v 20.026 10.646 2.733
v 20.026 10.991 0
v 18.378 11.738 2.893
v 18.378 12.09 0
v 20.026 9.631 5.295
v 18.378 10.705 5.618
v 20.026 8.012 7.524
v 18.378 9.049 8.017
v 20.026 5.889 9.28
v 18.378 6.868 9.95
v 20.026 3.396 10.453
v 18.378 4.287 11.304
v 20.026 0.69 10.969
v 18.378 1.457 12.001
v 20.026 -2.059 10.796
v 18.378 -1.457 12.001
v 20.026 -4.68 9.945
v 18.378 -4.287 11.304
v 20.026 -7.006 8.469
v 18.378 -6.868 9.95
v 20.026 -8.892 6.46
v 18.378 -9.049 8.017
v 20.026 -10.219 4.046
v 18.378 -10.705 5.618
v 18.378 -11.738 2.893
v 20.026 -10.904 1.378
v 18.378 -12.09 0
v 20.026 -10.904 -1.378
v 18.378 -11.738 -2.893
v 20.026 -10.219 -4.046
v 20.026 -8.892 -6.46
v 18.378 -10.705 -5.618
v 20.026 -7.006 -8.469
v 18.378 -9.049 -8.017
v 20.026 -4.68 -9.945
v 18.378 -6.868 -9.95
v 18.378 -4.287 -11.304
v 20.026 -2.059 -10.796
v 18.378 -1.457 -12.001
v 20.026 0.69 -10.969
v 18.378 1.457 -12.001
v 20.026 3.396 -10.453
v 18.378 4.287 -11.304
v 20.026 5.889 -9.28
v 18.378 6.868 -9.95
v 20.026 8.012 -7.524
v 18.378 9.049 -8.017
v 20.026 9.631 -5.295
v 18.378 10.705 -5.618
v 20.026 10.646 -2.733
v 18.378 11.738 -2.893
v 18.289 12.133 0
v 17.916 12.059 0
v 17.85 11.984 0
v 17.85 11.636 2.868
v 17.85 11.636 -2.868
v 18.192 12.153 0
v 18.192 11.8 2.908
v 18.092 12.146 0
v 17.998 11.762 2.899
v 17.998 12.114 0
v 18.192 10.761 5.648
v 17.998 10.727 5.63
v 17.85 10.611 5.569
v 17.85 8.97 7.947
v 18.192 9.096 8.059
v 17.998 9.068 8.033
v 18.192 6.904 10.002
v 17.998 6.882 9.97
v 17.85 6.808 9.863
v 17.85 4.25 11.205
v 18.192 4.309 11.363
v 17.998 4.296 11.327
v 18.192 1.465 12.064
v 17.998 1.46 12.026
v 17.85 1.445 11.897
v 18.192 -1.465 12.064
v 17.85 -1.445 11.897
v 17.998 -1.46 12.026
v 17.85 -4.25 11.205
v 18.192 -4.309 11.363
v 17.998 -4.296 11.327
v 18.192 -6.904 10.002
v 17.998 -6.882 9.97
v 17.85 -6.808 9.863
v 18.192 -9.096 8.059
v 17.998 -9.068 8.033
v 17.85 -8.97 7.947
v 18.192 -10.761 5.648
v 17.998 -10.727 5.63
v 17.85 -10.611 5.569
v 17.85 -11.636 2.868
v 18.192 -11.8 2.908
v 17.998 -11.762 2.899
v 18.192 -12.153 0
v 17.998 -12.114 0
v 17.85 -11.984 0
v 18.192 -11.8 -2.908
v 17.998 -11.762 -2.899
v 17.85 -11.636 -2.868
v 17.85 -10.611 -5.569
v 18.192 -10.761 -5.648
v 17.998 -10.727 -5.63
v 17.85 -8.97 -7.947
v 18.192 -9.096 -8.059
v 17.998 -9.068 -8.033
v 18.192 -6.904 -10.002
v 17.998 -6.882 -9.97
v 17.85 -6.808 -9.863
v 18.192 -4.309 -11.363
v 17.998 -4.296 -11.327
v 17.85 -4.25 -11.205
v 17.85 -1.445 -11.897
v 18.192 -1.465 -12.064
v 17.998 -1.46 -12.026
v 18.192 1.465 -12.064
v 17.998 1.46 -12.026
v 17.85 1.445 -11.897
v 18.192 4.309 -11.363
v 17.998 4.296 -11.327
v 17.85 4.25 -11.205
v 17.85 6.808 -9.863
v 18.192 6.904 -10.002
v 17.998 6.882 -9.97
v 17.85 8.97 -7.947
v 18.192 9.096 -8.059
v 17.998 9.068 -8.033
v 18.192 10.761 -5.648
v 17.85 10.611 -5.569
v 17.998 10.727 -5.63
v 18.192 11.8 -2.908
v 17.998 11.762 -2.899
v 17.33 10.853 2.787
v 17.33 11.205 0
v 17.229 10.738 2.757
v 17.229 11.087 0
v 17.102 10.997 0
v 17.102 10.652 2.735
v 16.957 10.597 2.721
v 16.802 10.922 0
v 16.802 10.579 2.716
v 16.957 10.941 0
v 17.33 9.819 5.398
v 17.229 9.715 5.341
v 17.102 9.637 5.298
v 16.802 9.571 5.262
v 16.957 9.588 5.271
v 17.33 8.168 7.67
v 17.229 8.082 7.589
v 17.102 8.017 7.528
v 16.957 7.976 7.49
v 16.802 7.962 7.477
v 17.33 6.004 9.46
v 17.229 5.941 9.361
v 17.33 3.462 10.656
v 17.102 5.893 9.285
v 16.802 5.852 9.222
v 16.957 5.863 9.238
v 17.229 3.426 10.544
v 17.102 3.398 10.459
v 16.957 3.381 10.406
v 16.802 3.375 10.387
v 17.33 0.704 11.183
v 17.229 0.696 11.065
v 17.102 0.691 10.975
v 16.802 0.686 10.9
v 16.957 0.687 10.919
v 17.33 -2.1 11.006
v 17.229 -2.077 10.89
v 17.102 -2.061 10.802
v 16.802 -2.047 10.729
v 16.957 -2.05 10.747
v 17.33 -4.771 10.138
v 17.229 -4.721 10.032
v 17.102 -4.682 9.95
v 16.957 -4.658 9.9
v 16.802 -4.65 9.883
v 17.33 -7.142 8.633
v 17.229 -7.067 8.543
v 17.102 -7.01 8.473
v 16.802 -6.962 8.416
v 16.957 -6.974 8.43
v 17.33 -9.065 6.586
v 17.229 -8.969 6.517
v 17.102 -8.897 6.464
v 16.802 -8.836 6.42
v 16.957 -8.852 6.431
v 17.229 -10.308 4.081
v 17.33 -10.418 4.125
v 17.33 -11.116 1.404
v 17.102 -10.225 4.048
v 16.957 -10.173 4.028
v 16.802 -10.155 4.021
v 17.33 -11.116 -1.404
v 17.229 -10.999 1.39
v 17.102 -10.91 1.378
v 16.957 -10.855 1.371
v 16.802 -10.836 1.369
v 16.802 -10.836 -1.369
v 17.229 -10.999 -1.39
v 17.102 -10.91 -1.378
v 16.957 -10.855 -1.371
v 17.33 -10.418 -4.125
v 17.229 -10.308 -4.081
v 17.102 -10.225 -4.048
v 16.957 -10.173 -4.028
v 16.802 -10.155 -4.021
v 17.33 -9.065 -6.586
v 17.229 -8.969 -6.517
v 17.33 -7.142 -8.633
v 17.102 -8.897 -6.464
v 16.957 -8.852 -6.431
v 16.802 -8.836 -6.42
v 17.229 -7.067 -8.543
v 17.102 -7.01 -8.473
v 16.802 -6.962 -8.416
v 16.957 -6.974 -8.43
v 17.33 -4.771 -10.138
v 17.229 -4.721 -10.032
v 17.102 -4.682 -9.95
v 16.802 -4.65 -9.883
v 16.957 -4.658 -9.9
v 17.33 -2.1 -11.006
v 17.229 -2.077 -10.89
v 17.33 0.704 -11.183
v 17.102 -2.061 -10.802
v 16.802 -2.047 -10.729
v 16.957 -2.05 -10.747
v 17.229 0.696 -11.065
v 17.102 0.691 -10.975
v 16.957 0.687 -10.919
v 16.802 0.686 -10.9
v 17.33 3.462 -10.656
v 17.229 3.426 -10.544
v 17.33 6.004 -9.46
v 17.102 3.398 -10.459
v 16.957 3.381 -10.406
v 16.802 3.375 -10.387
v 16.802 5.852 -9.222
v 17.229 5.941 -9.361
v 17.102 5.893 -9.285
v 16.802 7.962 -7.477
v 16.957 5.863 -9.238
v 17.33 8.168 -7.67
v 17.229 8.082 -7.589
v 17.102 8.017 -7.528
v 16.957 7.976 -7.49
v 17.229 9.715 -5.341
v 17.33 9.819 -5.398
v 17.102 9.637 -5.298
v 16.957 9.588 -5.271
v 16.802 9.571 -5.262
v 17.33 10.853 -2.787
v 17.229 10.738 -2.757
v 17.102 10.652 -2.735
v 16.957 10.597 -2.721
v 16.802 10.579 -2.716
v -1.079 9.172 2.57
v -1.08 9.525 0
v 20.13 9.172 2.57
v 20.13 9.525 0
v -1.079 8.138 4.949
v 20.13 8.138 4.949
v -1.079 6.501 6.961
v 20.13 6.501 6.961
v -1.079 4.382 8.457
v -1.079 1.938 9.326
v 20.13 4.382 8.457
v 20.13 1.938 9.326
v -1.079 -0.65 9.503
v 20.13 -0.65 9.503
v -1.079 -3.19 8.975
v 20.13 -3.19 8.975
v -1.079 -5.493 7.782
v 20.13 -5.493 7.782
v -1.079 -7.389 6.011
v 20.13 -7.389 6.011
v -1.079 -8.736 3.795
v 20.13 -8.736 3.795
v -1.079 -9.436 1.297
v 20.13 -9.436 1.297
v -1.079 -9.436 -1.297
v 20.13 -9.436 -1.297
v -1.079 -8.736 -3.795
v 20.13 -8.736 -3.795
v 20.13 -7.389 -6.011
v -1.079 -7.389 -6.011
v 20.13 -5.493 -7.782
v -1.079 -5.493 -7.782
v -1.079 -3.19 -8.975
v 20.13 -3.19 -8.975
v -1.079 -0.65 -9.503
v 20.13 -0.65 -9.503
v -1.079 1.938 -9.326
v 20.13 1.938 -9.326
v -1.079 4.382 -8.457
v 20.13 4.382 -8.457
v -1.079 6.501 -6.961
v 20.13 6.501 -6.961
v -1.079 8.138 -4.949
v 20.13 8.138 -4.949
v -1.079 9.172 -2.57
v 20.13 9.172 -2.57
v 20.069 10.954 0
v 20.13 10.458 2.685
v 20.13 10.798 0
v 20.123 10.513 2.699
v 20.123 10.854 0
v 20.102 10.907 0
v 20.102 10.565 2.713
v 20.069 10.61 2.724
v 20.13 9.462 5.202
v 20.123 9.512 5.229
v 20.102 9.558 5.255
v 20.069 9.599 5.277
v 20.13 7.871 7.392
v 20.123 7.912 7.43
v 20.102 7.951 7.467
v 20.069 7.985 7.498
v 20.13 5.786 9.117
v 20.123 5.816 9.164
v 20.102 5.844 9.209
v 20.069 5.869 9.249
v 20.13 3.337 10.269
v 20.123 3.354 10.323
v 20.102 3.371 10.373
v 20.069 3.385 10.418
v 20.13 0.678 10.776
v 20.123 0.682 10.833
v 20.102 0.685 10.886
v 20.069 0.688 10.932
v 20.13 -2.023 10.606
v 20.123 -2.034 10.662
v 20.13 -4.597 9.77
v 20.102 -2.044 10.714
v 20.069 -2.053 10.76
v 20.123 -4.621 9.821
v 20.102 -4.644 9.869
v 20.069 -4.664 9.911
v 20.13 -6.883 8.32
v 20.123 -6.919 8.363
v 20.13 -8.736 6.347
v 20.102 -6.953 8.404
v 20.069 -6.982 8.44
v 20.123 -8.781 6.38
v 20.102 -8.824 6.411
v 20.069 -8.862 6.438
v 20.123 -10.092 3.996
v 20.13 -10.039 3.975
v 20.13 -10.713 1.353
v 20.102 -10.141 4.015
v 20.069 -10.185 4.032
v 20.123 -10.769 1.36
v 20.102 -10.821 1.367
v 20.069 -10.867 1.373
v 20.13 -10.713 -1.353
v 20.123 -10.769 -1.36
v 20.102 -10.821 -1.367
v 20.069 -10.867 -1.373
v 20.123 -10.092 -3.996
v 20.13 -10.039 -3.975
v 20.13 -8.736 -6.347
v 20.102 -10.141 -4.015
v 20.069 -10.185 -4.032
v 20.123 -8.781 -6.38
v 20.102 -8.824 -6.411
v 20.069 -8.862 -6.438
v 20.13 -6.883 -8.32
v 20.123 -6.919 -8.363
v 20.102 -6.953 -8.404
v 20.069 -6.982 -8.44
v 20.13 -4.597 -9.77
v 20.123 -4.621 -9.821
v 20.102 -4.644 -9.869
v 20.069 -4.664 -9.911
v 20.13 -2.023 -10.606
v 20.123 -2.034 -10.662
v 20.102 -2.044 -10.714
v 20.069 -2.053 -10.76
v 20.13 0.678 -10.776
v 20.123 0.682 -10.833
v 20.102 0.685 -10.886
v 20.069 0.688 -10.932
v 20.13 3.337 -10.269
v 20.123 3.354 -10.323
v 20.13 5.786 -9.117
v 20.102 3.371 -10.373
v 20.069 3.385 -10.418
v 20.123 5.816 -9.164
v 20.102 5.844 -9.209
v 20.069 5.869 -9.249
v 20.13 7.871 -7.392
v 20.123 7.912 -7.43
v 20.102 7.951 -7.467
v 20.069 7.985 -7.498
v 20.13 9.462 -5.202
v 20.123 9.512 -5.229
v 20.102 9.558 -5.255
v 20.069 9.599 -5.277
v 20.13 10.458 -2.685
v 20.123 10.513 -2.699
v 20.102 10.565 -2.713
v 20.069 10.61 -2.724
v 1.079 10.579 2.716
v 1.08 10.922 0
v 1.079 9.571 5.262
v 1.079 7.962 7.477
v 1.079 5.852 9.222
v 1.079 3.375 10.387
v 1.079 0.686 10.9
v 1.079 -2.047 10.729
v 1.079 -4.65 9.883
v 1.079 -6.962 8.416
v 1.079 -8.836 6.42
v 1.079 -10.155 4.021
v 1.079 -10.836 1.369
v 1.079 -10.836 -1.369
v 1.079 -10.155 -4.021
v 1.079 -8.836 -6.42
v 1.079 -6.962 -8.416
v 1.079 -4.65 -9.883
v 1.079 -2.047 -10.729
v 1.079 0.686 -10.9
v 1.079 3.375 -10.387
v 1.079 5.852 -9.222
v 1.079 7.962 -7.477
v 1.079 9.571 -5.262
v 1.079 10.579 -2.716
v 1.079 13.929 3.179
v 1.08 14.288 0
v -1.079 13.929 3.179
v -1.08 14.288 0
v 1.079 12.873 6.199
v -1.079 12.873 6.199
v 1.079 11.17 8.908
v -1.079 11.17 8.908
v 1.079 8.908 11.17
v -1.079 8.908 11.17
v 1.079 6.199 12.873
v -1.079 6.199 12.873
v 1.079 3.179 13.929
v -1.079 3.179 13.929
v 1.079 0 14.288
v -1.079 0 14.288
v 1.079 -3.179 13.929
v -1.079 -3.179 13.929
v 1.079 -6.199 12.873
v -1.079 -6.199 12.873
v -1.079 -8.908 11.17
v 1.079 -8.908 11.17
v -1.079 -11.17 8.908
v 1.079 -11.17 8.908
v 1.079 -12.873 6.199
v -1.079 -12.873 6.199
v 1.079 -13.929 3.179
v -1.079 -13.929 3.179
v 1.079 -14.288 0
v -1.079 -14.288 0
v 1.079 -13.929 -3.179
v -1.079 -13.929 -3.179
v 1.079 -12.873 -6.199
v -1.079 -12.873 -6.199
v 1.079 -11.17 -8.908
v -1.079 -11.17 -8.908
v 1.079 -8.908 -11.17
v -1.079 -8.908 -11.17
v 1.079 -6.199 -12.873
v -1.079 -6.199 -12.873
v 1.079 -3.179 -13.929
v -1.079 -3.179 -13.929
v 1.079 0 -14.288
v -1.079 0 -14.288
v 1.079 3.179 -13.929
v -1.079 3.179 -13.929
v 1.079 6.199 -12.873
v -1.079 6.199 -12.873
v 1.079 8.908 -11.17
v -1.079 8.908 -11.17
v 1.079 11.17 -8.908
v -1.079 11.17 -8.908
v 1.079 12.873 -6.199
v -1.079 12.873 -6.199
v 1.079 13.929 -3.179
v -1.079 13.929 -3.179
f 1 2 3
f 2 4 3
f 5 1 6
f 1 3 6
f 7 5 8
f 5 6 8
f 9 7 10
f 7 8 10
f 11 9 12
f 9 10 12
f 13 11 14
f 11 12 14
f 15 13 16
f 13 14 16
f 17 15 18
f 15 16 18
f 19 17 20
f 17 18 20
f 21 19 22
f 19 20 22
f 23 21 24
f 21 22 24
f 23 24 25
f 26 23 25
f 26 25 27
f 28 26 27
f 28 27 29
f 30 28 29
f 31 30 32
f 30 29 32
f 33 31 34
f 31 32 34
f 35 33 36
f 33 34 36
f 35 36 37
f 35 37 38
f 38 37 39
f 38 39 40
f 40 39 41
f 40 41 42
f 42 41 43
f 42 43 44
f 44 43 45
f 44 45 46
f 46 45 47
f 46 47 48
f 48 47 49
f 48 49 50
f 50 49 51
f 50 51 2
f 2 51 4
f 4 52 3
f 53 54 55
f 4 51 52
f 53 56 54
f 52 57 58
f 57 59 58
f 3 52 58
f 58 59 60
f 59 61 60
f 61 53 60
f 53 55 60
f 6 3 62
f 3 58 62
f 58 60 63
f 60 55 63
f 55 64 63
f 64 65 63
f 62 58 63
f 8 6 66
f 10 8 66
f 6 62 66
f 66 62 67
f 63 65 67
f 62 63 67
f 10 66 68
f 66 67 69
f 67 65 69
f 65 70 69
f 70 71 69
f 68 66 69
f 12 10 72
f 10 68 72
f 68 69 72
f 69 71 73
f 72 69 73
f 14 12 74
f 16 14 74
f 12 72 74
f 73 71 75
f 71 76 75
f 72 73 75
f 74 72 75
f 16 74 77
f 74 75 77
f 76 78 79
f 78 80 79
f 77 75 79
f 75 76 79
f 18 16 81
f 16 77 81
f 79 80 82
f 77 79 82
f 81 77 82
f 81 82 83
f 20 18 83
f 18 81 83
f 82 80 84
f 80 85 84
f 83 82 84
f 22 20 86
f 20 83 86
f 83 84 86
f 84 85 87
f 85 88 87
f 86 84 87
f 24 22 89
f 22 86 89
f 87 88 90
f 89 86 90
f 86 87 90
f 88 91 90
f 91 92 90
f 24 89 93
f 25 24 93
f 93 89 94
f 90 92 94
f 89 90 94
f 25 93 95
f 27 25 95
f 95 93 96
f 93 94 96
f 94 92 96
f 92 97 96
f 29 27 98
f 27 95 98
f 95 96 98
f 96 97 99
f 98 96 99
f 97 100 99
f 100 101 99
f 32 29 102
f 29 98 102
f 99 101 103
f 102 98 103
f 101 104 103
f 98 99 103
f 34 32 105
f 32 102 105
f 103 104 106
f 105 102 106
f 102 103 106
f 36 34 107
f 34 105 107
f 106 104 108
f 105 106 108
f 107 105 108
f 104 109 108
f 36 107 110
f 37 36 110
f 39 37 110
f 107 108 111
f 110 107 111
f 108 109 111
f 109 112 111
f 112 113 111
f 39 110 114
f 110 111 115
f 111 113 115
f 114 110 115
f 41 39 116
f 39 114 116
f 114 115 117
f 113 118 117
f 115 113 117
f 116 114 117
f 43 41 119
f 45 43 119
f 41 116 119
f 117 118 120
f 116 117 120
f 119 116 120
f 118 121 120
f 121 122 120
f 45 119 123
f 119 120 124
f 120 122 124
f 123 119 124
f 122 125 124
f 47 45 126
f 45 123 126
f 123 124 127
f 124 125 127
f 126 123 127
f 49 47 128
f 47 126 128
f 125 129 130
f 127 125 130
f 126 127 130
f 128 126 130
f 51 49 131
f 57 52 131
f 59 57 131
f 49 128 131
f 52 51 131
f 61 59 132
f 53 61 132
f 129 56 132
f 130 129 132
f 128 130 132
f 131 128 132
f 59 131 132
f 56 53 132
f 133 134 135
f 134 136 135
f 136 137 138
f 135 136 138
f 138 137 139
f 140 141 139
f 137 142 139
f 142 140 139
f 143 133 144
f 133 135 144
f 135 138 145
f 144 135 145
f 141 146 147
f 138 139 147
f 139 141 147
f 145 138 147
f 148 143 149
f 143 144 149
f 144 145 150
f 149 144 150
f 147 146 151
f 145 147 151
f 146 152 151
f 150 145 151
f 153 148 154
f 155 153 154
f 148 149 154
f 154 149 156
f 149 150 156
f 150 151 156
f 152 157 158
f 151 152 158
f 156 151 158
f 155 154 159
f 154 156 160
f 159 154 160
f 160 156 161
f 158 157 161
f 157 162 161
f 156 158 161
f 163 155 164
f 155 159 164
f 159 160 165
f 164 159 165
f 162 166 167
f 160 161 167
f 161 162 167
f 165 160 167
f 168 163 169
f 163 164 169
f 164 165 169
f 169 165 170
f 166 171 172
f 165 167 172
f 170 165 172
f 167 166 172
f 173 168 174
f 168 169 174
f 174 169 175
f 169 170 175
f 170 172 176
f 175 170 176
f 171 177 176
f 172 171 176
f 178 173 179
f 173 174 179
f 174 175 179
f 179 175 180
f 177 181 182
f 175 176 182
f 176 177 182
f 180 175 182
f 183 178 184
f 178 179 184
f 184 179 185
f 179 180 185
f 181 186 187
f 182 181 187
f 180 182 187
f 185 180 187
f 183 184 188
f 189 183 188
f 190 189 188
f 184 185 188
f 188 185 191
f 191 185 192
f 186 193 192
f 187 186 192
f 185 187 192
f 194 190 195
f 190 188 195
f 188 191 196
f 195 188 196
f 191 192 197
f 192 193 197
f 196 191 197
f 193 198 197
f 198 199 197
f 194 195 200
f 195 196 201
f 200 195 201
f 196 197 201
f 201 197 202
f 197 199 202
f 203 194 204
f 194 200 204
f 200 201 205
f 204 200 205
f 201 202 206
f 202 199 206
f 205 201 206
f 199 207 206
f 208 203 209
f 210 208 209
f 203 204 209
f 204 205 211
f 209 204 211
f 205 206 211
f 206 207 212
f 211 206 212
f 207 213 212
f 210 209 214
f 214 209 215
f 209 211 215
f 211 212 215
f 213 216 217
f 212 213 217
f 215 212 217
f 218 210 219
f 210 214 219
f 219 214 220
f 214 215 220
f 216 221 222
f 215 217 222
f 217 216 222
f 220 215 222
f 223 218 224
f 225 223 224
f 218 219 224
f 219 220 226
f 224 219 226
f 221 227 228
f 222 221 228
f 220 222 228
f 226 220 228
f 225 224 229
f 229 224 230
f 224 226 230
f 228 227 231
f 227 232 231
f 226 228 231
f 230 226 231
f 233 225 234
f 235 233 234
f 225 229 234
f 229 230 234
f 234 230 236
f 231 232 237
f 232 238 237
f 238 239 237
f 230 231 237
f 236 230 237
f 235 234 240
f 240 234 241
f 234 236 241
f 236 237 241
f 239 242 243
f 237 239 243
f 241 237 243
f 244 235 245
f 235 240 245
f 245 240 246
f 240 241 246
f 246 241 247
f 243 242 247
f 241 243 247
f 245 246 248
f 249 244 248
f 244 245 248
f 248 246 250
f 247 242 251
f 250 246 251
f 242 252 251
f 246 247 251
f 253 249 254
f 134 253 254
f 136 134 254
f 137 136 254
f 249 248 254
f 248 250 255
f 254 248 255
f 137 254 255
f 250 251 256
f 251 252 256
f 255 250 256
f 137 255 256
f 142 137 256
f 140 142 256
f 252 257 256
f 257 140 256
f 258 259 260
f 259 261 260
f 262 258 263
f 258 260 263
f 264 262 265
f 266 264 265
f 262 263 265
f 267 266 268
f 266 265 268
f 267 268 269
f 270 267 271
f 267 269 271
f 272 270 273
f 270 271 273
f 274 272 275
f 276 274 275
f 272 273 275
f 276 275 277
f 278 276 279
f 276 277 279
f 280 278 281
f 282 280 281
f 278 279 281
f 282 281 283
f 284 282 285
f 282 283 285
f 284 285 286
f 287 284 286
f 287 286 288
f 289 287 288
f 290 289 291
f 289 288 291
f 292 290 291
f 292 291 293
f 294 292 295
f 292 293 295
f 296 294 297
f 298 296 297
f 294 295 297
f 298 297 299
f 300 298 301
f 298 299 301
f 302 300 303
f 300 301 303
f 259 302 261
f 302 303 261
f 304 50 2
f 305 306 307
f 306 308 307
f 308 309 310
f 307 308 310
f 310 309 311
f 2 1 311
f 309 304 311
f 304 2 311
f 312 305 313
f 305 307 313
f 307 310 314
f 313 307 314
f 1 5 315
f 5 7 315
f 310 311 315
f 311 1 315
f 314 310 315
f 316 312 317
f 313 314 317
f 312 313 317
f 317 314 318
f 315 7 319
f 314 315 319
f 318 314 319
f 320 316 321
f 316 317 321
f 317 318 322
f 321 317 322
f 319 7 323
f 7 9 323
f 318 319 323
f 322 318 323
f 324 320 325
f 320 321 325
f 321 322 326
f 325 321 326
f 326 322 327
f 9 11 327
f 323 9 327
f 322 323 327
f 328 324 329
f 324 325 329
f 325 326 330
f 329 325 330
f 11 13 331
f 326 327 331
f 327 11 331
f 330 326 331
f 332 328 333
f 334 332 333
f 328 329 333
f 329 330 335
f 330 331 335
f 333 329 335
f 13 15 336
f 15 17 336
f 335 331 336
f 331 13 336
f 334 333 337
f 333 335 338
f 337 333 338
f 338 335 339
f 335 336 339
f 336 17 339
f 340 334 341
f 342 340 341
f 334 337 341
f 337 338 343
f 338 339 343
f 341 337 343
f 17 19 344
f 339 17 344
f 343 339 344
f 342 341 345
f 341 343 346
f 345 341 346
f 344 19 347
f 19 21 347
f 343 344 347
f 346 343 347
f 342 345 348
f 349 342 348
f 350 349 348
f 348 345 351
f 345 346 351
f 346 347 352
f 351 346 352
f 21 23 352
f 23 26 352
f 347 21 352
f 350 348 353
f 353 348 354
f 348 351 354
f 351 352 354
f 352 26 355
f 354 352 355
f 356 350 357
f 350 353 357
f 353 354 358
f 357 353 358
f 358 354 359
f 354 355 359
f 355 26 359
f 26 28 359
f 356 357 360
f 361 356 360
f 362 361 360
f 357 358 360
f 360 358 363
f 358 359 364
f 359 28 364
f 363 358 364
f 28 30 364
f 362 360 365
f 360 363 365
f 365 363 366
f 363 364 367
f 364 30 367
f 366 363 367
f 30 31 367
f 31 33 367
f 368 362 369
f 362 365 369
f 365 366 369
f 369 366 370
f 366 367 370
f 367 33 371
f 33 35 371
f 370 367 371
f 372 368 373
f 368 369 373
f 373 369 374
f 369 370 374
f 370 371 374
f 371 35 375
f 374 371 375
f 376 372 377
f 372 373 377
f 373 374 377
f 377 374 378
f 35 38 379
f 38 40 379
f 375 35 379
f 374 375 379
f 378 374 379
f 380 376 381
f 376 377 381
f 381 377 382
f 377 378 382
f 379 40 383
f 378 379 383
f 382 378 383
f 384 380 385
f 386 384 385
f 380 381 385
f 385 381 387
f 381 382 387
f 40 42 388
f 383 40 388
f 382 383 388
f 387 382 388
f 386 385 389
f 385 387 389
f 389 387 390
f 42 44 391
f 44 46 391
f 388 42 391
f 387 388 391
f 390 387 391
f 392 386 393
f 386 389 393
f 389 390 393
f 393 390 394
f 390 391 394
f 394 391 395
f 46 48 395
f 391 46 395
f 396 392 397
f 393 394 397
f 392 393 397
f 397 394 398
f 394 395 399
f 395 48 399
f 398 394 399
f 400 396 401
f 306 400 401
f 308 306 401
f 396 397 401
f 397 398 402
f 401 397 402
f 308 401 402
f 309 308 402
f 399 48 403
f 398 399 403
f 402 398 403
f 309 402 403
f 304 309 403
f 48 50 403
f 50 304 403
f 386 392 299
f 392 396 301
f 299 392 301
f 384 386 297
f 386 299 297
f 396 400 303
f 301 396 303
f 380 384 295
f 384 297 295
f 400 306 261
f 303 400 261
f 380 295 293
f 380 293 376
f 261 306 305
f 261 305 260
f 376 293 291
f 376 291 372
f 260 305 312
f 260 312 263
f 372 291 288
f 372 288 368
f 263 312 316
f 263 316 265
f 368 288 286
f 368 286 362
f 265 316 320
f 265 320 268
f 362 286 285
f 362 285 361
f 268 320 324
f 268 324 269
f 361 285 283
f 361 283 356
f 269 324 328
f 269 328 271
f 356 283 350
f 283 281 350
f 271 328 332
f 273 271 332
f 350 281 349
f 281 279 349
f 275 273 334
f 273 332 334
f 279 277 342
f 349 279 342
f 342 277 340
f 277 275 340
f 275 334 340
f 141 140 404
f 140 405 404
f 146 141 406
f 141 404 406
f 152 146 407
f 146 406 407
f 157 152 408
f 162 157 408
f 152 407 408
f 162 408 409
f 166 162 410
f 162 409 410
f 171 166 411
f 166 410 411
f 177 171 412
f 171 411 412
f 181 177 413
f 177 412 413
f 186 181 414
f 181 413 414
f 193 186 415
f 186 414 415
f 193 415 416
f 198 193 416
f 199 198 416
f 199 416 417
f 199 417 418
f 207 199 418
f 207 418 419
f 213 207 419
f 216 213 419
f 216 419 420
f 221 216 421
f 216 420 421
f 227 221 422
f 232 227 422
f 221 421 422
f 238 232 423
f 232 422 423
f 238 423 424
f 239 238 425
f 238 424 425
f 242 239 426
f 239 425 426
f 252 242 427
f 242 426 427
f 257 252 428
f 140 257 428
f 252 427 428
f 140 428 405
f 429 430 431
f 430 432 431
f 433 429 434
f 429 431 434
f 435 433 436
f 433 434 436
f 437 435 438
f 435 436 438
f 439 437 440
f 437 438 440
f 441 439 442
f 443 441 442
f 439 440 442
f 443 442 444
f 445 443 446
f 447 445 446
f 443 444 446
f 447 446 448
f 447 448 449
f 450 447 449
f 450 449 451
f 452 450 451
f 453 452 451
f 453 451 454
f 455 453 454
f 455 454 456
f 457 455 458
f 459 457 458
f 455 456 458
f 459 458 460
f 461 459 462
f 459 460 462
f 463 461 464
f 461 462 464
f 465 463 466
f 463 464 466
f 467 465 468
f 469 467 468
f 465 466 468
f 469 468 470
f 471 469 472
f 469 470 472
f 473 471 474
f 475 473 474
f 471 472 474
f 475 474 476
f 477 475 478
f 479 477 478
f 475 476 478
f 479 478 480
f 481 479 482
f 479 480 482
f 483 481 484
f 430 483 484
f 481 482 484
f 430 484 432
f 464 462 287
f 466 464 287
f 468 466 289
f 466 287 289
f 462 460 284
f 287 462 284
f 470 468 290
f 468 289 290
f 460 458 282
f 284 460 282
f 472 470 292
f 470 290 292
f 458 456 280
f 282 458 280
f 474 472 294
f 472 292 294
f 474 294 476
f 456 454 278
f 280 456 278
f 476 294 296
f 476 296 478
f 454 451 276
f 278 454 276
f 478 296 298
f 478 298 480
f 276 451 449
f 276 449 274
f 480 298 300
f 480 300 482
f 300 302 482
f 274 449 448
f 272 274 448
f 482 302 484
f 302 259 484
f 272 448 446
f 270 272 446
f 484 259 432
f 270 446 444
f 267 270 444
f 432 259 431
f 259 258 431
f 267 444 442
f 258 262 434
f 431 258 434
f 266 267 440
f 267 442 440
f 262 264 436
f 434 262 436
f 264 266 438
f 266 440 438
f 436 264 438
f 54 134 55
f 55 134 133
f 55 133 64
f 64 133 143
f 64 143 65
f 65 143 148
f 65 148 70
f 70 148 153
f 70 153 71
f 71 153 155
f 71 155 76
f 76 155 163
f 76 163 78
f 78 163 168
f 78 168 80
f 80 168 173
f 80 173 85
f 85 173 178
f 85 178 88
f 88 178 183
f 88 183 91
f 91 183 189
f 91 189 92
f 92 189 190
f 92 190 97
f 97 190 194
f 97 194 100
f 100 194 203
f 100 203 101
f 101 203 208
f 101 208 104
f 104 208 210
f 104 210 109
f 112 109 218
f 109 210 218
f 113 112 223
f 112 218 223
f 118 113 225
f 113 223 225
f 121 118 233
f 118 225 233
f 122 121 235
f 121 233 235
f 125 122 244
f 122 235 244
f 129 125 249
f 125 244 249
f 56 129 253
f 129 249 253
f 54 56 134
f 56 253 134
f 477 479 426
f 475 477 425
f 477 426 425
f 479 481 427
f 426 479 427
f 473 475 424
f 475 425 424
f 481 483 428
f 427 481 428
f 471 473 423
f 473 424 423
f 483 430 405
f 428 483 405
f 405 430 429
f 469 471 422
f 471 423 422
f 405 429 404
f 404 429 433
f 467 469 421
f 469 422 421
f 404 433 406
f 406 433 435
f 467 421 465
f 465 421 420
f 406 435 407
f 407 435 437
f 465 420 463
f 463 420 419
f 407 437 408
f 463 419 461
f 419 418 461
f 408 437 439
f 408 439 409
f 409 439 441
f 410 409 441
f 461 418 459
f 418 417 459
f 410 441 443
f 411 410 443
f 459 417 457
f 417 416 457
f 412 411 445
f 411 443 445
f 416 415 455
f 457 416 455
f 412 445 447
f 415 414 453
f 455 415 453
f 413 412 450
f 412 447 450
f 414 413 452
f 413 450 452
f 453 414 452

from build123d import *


with BuildPart() as f1:
    # F0 (on Top) → F1 (revolve)
    with BuildSketch(Plane.XY):
        with BuildLine():
            Line((1.0795, 14.2875), (-1.0795, 14.2875))
            Line((-1.0795, 14.2875), (-1.0795, 9.525))
            Line((-1.0795, 9.525), (1.0795, 9.525))
            Line((1.0795, 9.525), (20.1295, 9.525))
            Line((20.1295, 9.525), (20.1295, 10.797701))
            ThreePointArc((20.1295, 10.797701), (20.10202, 10.907294), (20.026081, 10.990955))
            Line((20.026081, 10.990955), (18.378363, 12.089584))
            ThreePointArc((18.378363, 12.089584), (18.092305, 12.146192), (17.850004, 11.983947))
            Line((17.850004, 11.983947), (17.330457, 11.204732))
            ThreePointArc((17.330457, 11.204732), (17.101739, 10.997127), (16.802127, 10.922))
            Line((16.802127, 10.922), (1.0795, 10.922))
            Line((1.0795, 10.922), (1.0795, 14.2875))
        make_face()
    revolve(axis=Axis((9.354087, 0, 0), (1, 0, 0)))


solid = f1.part
